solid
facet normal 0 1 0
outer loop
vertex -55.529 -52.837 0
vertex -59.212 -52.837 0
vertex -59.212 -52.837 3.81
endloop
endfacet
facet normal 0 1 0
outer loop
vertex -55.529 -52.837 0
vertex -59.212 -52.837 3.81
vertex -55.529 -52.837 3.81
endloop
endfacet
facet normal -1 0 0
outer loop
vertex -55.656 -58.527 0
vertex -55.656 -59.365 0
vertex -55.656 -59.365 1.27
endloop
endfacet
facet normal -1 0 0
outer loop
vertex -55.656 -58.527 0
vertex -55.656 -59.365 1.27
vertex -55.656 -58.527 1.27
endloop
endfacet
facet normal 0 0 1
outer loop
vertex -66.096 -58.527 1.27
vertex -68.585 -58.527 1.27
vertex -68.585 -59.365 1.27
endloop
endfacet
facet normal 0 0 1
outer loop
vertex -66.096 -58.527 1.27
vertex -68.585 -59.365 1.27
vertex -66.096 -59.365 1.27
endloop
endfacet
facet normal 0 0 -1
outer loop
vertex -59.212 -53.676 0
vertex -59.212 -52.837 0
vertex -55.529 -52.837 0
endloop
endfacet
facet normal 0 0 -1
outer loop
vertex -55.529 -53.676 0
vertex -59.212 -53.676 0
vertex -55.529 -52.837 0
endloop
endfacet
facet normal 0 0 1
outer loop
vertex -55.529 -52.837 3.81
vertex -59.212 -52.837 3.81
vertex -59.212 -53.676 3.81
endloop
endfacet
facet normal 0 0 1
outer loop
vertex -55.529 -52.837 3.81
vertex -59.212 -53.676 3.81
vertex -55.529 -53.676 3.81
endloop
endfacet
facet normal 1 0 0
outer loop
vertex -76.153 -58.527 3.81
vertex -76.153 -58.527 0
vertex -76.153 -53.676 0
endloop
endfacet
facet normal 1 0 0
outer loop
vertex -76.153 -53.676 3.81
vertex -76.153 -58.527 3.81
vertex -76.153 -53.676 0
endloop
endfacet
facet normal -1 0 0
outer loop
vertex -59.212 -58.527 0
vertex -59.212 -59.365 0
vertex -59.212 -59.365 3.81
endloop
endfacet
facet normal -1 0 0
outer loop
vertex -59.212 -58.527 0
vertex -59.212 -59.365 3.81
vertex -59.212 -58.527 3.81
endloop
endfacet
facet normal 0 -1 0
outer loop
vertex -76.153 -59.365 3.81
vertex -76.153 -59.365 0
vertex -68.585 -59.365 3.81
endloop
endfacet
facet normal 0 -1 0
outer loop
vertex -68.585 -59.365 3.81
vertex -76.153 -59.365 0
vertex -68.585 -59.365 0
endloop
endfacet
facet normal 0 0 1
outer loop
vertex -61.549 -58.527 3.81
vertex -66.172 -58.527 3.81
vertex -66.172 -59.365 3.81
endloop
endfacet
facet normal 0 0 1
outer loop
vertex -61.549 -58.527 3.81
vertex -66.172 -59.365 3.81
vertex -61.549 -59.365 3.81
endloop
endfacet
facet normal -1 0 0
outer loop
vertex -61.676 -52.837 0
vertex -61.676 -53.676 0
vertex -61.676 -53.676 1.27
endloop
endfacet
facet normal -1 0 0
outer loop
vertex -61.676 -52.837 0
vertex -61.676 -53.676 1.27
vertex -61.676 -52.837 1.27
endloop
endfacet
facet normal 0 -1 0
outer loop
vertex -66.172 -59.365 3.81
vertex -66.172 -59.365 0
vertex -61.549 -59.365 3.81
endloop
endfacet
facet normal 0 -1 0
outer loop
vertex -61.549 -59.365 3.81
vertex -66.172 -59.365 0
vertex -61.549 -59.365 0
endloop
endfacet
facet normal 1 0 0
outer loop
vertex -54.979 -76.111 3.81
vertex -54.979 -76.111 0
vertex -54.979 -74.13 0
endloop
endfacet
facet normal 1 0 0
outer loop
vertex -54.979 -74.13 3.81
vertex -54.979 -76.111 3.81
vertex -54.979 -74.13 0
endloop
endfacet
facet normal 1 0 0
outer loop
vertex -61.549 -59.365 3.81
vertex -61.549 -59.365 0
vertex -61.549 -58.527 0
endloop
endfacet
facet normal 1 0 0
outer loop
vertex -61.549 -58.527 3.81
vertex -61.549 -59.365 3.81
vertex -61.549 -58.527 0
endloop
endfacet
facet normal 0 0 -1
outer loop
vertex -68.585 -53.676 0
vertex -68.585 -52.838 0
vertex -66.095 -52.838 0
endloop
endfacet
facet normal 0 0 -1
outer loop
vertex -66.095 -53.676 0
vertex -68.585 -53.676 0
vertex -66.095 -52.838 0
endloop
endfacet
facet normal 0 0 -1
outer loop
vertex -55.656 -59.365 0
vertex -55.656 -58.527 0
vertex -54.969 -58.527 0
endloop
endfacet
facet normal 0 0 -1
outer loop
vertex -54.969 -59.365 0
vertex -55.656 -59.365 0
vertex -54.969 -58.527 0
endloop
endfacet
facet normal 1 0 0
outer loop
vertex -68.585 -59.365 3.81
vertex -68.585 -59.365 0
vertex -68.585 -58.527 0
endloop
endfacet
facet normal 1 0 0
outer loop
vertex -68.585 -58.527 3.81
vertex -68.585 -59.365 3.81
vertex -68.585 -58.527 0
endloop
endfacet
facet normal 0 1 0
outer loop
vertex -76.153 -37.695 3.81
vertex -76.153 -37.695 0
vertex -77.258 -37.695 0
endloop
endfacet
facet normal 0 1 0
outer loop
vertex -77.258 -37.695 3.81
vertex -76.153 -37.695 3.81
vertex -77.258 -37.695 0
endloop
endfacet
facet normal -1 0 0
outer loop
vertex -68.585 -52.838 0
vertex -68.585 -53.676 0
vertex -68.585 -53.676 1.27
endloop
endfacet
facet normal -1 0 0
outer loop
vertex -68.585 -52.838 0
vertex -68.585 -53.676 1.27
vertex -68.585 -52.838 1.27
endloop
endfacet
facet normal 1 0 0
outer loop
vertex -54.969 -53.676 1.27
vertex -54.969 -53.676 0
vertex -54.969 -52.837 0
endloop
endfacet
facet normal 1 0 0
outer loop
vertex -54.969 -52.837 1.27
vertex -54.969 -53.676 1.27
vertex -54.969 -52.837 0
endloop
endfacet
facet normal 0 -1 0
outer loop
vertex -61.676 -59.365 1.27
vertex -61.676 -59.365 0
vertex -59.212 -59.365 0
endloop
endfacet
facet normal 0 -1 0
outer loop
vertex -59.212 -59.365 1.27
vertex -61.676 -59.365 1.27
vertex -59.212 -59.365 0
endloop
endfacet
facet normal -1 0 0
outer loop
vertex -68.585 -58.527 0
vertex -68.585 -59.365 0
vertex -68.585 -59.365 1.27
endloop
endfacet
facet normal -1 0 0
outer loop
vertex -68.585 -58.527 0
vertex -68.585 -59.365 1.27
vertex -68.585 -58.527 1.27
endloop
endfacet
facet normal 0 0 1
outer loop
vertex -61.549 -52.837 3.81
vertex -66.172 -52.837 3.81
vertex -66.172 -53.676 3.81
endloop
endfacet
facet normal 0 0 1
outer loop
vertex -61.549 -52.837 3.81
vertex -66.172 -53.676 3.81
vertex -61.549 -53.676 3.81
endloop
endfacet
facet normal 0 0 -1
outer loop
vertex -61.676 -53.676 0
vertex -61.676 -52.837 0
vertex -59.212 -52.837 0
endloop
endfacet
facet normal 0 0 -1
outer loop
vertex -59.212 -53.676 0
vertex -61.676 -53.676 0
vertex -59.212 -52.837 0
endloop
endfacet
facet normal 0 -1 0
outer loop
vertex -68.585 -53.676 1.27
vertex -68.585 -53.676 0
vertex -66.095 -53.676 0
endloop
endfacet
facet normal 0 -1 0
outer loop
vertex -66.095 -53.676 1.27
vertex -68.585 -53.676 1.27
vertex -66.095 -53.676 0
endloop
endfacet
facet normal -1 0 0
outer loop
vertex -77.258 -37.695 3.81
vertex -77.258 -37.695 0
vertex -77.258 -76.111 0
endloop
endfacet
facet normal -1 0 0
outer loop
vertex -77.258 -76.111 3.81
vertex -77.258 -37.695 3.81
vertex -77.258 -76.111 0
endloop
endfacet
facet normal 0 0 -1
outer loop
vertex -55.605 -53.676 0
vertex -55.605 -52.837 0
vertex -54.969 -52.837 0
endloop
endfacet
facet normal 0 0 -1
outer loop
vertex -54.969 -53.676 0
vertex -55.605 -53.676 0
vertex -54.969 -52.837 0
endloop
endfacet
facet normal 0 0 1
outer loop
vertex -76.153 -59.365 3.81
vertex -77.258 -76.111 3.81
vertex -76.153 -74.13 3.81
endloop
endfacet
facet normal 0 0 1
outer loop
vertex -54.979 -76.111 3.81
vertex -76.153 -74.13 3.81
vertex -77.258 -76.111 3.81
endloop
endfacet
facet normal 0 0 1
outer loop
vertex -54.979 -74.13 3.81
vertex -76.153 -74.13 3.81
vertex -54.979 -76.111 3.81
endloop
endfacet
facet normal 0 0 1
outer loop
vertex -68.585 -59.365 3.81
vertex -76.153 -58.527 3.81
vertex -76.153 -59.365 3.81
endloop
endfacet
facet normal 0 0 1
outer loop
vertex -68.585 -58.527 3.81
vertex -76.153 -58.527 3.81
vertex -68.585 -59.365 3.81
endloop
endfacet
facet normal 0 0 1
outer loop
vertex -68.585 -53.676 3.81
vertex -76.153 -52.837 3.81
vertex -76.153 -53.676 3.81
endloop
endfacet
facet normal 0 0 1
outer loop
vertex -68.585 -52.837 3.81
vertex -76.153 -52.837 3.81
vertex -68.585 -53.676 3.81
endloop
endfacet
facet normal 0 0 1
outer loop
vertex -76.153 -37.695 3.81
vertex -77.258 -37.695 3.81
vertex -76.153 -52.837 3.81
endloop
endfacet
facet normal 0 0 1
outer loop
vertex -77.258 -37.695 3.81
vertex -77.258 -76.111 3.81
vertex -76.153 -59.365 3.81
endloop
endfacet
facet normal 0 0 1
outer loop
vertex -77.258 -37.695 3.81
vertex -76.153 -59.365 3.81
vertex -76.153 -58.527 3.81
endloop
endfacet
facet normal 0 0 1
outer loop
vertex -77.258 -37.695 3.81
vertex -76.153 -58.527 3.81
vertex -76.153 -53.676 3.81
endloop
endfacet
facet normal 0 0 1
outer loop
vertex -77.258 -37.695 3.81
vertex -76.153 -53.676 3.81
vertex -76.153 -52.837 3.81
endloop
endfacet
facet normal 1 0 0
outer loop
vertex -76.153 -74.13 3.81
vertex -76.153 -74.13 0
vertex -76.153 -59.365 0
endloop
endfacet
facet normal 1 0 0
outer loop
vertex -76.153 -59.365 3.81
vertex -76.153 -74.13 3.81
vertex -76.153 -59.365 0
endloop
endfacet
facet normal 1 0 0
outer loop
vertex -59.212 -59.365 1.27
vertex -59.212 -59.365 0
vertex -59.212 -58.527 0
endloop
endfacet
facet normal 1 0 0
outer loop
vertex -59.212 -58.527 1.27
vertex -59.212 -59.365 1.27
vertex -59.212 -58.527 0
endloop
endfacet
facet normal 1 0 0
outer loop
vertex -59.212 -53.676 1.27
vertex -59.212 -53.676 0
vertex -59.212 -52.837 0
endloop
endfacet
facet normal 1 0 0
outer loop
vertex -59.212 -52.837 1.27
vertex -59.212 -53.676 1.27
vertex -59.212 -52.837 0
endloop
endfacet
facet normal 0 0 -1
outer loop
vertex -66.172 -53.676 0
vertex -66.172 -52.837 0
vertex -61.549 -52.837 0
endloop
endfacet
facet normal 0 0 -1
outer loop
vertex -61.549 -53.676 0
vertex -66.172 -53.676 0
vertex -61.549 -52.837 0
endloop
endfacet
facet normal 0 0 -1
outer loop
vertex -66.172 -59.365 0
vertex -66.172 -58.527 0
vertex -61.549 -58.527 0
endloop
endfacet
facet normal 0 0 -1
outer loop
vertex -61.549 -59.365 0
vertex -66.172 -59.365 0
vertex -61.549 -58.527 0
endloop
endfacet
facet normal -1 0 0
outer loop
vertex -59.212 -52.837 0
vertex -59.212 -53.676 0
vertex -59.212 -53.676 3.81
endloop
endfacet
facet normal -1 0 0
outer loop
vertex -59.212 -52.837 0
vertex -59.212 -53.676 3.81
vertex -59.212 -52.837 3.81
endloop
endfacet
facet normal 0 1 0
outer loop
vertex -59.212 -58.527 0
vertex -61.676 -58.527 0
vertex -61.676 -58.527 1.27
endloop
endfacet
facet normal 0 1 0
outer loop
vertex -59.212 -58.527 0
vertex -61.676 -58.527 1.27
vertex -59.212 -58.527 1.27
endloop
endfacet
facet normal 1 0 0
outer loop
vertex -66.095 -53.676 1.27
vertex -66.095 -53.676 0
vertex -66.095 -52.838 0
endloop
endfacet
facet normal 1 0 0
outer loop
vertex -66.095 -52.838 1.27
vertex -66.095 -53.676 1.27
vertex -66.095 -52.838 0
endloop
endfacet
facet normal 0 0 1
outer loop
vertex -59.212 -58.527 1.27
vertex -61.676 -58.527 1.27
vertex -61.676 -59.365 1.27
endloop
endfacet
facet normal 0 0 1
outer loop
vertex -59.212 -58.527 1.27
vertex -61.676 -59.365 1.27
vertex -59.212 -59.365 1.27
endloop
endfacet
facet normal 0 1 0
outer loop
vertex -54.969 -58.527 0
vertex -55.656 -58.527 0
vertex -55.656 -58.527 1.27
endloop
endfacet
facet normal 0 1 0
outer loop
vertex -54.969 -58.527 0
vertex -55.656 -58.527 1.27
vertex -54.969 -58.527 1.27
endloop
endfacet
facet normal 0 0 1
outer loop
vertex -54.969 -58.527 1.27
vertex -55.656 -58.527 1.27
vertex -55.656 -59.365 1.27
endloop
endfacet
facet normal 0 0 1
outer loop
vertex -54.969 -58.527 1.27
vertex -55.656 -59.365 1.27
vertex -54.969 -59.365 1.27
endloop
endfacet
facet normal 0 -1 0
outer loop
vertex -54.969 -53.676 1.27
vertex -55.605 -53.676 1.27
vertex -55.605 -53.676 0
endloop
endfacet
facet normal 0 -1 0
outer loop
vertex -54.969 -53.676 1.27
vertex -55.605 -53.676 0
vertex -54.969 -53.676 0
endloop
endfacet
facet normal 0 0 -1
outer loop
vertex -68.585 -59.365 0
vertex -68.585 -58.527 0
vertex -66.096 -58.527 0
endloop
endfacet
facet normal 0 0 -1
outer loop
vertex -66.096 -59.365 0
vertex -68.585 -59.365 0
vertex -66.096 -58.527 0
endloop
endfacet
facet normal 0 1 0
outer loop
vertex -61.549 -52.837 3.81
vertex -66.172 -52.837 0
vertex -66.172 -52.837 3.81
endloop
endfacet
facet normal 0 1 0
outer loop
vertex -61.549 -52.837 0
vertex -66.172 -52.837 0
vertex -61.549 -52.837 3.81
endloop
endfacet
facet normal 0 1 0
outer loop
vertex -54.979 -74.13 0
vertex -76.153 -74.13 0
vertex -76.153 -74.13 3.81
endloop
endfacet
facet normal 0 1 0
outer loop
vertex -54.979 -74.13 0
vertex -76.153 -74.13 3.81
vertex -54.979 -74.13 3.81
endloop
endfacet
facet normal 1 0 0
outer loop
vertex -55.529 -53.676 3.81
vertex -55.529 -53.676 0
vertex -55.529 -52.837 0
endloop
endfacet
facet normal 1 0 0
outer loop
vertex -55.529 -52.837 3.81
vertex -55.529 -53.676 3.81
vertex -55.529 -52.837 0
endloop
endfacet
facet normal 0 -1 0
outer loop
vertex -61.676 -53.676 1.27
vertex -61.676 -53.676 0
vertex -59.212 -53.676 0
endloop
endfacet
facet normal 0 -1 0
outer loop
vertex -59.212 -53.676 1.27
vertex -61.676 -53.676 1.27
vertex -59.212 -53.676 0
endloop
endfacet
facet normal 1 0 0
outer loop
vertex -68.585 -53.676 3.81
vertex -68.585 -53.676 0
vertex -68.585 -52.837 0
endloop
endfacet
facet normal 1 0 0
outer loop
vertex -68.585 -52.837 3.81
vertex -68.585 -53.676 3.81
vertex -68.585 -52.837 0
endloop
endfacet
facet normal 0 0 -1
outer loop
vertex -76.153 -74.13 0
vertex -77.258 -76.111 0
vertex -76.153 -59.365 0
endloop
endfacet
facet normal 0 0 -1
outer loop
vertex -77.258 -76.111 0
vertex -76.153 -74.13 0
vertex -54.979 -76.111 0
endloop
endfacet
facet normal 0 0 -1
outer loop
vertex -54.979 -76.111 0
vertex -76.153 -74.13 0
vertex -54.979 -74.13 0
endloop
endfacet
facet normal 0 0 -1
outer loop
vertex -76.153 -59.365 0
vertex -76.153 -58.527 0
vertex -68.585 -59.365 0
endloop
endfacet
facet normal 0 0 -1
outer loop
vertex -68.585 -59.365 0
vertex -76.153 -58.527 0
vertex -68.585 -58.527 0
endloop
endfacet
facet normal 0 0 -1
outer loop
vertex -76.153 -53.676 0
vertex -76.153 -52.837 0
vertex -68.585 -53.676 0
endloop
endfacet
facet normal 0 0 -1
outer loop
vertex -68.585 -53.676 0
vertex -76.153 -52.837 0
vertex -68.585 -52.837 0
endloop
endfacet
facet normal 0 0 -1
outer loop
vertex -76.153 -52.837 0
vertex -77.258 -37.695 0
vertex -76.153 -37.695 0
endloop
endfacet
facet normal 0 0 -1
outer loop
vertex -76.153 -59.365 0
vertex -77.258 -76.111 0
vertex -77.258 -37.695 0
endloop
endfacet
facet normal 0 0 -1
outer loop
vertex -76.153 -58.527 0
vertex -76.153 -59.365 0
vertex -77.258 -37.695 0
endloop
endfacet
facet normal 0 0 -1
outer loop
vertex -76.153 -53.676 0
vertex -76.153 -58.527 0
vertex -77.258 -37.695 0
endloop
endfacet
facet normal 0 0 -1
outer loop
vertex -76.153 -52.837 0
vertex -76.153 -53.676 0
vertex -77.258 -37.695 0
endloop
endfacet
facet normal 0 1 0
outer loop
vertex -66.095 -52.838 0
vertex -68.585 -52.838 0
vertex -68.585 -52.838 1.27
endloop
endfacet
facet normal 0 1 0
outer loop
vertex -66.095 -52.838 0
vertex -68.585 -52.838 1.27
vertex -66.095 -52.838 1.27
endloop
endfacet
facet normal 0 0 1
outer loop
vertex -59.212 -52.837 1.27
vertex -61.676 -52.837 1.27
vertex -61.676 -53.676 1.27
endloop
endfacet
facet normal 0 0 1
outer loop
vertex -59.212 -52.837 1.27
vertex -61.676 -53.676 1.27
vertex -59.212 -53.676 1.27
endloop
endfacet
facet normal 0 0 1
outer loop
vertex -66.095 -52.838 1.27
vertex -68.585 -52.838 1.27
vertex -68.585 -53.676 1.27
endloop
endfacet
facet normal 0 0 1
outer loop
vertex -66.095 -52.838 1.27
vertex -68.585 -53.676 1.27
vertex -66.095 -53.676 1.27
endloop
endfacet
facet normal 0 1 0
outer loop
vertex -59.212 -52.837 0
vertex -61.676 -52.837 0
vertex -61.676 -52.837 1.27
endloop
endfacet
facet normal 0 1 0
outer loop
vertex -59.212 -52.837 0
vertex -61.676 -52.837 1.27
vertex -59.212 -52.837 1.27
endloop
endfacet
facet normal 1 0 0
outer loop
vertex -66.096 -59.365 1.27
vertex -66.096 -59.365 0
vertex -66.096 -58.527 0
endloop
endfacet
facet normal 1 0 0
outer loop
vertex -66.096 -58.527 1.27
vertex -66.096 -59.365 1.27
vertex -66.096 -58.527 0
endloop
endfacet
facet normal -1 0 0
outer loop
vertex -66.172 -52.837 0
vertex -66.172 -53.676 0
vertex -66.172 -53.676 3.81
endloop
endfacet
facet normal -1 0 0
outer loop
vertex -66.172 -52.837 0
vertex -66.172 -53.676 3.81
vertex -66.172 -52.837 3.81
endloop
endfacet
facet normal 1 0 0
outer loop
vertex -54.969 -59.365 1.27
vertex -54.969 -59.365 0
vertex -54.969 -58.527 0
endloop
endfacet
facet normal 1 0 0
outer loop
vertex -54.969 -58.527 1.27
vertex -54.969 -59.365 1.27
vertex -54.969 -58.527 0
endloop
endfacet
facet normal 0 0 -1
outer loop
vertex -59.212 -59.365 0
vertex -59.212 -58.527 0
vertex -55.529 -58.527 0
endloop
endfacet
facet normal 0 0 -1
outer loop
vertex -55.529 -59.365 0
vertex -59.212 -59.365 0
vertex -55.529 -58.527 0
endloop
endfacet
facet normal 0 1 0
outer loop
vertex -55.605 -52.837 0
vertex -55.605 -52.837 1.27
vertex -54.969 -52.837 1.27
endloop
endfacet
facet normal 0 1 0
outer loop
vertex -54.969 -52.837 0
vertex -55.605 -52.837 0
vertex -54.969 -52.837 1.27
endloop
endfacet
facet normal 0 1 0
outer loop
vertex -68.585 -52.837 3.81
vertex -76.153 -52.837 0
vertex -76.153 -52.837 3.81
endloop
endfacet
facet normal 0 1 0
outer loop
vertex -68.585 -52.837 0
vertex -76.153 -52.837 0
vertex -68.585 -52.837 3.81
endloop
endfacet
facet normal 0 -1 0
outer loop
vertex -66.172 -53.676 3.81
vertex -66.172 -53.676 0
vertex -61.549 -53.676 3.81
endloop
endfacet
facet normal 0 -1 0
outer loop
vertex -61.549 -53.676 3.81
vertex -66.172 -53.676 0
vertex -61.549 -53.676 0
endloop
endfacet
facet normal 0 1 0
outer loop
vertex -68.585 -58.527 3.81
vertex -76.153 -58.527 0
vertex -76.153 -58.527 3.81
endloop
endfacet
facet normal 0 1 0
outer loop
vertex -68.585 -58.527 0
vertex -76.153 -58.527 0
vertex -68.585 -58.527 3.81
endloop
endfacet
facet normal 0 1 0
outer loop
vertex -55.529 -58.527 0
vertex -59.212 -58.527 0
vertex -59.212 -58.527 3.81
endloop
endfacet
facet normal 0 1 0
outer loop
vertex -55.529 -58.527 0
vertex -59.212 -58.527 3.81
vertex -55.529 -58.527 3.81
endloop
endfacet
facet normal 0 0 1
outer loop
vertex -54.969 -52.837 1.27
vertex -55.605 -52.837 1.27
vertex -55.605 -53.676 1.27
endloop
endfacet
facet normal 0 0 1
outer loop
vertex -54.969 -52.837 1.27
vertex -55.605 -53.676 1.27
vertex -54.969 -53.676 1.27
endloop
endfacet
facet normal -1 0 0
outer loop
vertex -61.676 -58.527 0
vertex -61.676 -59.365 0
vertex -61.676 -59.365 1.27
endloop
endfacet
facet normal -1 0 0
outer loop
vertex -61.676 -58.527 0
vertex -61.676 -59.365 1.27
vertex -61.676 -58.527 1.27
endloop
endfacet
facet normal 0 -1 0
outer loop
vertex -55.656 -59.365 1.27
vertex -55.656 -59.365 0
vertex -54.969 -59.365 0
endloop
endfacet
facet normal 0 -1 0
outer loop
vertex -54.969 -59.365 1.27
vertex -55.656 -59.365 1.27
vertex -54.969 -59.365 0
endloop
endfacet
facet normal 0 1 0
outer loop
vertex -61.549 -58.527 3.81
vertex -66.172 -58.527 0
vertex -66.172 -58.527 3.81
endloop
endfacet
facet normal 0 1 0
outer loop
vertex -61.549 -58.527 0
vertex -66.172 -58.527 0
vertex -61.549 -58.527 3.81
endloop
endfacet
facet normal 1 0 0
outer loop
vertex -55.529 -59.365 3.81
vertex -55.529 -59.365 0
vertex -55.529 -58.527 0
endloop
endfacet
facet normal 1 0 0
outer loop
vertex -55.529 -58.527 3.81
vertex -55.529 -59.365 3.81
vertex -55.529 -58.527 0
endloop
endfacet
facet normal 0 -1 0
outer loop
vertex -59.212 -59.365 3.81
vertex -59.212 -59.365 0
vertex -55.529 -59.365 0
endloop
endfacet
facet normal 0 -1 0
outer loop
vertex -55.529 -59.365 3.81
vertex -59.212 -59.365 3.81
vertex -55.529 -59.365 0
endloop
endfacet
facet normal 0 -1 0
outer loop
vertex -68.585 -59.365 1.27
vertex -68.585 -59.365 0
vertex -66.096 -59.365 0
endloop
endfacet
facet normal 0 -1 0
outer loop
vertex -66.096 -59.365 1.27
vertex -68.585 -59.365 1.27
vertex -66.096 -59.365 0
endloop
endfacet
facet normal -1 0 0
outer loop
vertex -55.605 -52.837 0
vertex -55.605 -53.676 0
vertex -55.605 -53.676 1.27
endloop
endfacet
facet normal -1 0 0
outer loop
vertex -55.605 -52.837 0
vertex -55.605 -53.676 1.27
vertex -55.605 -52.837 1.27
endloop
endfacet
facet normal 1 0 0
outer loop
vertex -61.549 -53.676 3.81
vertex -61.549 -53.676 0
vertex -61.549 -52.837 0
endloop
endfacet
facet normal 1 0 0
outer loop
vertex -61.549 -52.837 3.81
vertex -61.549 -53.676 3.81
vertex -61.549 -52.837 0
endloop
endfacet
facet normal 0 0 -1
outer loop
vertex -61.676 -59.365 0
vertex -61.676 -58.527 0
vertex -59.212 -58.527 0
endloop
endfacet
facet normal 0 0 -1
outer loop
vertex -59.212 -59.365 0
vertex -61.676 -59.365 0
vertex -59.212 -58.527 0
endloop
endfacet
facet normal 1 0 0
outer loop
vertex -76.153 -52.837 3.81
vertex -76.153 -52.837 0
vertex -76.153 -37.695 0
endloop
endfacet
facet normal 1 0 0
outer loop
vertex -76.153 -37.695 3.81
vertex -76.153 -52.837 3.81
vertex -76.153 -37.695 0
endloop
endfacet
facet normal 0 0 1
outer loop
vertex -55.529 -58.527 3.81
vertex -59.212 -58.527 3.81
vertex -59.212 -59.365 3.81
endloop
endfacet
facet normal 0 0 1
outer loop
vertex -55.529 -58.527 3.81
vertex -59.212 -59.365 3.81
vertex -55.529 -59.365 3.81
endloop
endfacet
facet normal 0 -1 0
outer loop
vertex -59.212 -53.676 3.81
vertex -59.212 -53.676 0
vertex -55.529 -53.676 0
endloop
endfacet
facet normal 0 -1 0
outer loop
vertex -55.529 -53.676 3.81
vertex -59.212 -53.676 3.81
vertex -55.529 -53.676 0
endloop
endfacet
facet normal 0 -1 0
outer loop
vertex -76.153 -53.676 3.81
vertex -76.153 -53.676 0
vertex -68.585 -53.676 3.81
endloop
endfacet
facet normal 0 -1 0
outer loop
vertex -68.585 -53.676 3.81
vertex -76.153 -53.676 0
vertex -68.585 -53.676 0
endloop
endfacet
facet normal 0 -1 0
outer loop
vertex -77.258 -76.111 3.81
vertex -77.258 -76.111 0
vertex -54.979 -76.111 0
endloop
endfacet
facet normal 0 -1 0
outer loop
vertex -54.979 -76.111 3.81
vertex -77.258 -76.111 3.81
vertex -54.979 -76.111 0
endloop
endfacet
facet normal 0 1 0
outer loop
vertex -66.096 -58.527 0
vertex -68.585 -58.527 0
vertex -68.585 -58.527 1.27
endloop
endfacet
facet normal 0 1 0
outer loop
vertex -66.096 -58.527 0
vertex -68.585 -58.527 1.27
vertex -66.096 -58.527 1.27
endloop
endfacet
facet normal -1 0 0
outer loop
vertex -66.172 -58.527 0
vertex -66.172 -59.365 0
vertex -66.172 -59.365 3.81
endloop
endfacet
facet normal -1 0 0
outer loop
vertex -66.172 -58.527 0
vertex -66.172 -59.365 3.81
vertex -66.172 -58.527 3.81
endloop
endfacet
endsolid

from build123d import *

# Parameters (mm, degrees)
F0_W     = 1.0678321123
F0_H     = 0.8382
F0_W_2   = 7.5681678877
F0_W_3   = 1.1050403118
F0_H_2   = 1.9812
F0_W_4   = 21.1741365492
F1_DEPTH = 3.81
F0_W_5   = 4.6228
F0_W_6   = 3.683
F2_W     = 2.4892
F2_H     = 0.8382
F3_DEPTH = 1.27
F2_W_2   = 2.4638
F2_W_3   = 0.6360414
F2_W_4   = 0.6868414


with BuildPart() as f1:
    # F0 (on Top) → F1 (new body)
    with BuildSketch(Plane.XY):
        Polygon((-77.2205814719, -53.6756315438), (-77.2205814719, -52.8374315438), (-76.1527493596, -52.8374315438), (-76.1527493596, -37.6954264457), (-77.2577896714, -37.6954264457), (-77.2577896714, -74.1296249426), (-76.1527493596, -74.1296249426), (-76.1527493596, -59.3652315438), (-77.2205814719, -59.3652315438), (-77.2205814719, -58.5270315438), (-76.1527493596, -58.5270315438), (-76.1527493596, -53.6756315438), align=None)
        with Locations((-76.6866654158, -53.2565315438)):
            Rectangle(F0_W, F0_H)
        with Locations((-72.3686654158, -53.2565315438)):
            Rectangle(F0_W_2, F0_H)
        with Locations((-76.6866654158, -58.9461315438)):
            Rectangle(F0_W, F0_H)
        with Locations((-72.3686654158, -58.9461315438)):
            Rectangle(F0_W_2, F0_H)
        with Locations((-76.7052695155, -75.1202249426)):
            Rectangle(F0_W_3, F0_H_2)
        with Locations((-65.565681085, -75.1202249426)):
            Rectangle(F0_W_4, F0_H_2)
    extrude(amount=F1_DEPTH)


with BuildPart() as f1b:
    # F0 (on Top) → F1, piece 2 (new body)
    with BuildSketch(Plane.XY):
        with Locations((-63.8601814719, -53.2565399426)):
            Rectangle(F0_W_5, F0_H)
    extrude(amount=F1_DEPTH)


with BuildPart() as f1c:
    # F0 (on Top) → F1, piece 3 (new body)
    with BuildSketch(Plane.XY):
        with Locations((-63.8601814719, -58.9461399426)):
            Rectangle(F0_W_5, F0_H)
    extrude(amount=F1_DEPTH)


with BuildPart() as f1d:
    # F0 (on Top) → F1, piece 4 (new body)
    with BuildSketch(Plane.XY):
        with Locations((-57.3704814719, -58.9461399426)):
            Rectangle(F0_W_6, F0_H)
    extrude(amount=F1_DEPTH)


with BuildPart() as f1e:
    # F0 (on Top) → F1, piece 5 (new body)
    with BuildSketch(Plane.XY):
        with Locations((-57.3704814719, -53.2565399426)):
            Rectangle(F0_W_6, F0_H)
    extrude(amount=F1_DEPTH)


with BuildPart() as f3:
    # F2 (on Top) → F3 (new body)
    with BuildSketch(Plane.XY):
        with Locations((-67.3399213506, -53.2567635043)):
            Rectangle(F2_W, F2_H)
    extrude(amount=F3_DEPTH)


with BuildPart() as f3b:
    # F2 (on Top) → F3, piece 2 (new body)
    with BuildSketch(Plane.XY):
        with Locations((-67.3401231768, -58.9462073794)):
            Rectangle(F2_W, F2_H)
    extrude(amount=F3_DEPTH)


with BuildPart() as f3c:
    # F2 (on Top) → F3, piece 3 (new body)
    with BuildSketch(Plane.XY):
        with Locations((-60.443864683, -53.2565605531)):
            Rectangle(F2_W_2, F2_H)
    extrude(amount=F3_DEPTH)


with BuildPart() as f3d:
    # F2 (on Top) → F3, piece 4 (new body)
    with BuildSketch(Plane.XY):
        with Locations((-60.4438327164, -58.9462131149)):
            Rectangle(F2_W_2, F2_H)
    extrude(amount=F3_DEPTH)


with BuildPart() as f3e:
    # F2 (on Top) → F3, piece 5 (new body)
    with BuildSketch(Plane.XY):
        with Locations((-55.2871607719, -53.2564221691)):
            Rectangle(F2_W_3, F2_H)
    extrude(amount=F3_DEPTH)


with BuildPart() as f3f:
    # F2 (on Top) → F3, piece 6 (new body)
    with BuildSketch(Plane.XY):
        with Locations((-55.3125607719, -58.9460662609)):
            Rectangle(F2_W_4, F2_H)
    extrude(amount=F3_DEPTH)


solid = Compound([f1.part, f1b.part, f1c.part, f1d.part, f1e.part, f3.part, f3b.part, f3c.part, f3d.part, f3e.part, f3f.part])
